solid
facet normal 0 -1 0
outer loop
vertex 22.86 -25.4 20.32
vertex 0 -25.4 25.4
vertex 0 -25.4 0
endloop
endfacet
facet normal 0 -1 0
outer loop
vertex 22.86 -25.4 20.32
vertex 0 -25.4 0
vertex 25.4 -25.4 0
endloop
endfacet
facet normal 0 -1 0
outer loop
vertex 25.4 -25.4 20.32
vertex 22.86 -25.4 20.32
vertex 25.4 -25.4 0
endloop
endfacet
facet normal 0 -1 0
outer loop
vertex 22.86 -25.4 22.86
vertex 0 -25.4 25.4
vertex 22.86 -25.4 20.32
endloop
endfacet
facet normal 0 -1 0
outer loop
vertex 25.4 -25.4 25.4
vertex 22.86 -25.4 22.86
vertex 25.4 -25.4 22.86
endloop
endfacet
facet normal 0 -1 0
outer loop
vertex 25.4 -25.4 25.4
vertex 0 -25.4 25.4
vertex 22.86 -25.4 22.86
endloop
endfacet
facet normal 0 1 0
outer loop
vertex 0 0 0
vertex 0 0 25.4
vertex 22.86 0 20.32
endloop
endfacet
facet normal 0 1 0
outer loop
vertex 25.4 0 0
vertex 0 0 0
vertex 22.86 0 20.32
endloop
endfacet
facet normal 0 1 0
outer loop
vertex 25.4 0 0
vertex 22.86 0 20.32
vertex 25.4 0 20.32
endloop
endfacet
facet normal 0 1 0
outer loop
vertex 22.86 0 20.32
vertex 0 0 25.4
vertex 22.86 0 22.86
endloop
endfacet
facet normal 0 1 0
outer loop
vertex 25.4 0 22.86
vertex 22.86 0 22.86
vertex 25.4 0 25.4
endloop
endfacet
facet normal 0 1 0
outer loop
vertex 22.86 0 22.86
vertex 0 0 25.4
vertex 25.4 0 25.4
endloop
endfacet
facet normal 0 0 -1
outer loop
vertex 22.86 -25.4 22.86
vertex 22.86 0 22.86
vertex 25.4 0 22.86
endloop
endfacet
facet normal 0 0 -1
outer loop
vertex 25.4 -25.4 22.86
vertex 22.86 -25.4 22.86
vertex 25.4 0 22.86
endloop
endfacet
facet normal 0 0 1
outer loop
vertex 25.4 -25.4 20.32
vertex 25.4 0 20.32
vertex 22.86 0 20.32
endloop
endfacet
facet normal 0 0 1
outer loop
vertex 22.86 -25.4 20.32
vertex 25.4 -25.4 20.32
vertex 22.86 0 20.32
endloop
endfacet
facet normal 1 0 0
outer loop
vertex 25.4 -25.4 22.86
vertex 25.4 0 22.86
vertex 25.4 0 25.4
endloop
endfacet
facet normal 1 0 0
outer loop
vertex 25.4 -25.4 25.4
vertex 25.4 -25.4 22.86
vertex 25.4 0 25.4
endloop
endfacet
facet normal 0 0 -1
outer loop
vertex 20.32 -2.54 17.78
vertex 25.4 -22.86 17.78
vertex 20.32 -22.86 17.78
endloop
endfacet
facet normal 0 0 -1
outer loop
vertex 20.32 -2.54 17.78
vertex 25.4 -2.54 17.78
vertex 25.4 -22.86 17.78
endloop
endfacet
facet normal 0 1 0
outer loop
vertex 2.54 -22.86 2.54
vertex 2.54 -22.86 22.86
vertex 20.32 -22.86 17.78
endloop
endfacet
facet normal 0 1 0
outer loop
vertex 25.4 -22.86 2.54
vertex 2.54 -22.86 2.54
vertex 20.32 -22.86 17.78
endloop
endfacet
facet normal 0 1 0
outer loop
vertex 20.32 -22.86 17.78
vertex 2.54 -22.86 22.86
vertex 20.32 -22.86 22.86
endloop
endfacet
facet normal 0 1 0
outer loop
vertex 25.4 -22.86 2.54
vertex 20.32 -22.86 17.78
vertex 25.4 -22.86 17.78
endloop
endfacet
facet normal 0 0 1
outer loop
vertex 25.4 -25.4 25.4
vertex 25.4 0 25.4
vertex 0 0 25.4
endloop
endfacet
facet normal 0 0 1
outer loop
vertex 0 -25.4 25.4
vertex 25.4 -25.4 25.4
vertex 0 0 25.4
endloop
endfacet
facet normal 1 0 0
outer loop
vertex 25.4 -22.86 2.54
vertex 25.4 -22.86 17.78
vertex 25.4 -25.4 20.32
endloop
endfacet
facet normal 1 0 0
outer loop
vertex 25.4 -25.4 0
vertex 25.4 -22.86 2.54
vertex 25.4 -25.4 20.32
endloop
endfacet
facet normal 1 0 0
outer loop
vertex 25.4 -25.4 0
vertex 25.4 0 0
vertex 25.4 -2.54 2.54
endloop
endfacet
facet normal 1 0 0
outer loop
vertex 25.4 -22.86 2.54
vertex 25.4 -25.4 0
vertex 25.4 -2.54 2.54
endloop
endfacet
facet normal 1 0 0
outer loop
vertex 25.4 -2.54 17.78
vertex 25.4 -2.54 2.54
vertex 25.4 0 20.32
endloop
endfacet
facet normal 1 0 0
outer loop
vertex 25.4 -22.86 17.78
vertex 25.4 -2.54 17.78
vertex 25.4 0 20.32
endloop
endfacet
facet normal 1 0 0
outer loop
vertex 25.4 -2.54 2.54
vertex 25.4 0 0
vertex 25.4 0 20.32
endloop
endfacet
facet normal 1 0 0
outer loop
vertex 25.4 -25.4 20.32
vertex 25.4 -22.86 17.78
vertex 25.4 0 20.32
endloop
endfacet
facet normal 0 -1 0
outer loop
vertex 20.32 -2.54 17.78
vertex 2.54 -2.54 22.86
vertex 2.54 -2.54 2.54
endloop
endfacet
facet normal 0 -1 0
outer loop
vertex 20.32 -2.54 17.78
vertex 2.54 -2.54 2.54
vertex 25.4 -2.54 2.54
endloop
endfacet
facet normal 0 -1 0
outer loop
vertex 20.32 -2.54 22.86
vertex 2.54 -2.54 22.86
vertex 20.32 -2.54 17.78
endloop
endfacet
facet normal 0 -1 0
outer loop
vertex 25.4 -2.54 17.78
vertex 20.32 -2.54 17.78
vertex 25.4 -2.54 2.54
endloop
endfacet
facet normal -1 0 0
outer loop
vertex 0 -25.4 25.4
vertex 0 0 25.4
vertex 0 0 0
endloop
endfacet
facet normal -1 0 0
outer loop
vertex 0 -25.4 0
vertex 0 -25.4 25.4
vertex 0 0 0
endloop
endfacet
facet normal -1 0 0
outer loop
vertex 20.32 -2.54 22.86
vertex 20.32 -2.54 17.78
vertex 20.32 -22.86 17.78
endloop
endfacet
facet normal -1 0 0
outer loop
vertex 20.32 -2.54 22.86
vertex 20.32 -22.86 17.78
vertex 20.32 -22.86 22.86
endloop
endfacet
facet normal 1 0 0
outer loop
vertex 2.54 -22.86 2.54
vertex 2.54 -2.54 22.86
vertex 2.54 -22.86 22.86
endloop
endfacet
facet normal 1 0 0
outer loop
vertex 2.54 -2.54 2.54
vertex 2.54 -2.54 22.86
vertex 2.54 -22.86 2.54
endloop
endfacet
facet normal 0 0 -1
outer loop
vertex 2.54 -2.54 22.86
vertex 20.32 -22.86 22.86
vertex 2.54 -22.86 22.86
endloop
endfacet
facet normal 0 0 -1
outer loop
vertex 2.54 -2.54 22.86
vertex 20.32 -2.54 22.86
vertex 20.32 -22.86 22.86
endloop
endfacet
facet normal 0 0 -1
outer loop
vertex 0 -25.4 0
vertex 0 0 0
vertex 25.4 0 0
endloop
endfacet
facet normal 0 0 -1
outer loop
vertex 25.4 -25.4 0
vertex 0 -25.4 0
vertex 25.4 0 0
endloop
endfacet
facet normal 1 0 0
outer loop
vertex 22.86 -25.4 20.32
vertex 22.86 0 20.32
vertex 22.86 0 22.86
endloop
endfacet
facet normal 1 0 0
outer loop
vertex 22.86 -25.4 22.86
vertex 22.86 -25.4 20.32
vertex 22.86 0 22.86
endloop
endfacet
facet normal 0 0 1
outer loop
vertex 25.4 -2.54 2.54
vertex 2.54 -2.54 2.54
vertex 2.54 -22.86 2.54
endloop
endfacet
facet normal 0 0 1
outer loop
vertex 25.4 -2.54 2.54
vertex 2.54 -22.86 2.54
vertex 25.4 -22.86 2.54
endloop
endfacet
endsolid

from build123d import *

# Parameters (mm, degrees)
F1_DEPTH = 25.4
F2_T     = -2.54


with BuildPart() as f1:
    # F0 (on Front) → F1 (new body)
    with BuildSketch(Plane.XZ):
        Polygon((0, 25.4), (0, 0), (25.4, 0), (25.4, 20.32), (22.86, 20.32), (22.86, 22.86), (25.4, 22.86), (25.4, 25.4), align=None)
    extrude(amount=F1_DEPTH)

    # F2
    f2_openings = [f1.faces().sort_by_distance(p)[0] for p in [
        (25.4, -12.7, 10.16),
    ]]
    offset(amount=F2_T, openings=f2_openings, kind=Kind.INTERSECTION)


solid = f1.part
